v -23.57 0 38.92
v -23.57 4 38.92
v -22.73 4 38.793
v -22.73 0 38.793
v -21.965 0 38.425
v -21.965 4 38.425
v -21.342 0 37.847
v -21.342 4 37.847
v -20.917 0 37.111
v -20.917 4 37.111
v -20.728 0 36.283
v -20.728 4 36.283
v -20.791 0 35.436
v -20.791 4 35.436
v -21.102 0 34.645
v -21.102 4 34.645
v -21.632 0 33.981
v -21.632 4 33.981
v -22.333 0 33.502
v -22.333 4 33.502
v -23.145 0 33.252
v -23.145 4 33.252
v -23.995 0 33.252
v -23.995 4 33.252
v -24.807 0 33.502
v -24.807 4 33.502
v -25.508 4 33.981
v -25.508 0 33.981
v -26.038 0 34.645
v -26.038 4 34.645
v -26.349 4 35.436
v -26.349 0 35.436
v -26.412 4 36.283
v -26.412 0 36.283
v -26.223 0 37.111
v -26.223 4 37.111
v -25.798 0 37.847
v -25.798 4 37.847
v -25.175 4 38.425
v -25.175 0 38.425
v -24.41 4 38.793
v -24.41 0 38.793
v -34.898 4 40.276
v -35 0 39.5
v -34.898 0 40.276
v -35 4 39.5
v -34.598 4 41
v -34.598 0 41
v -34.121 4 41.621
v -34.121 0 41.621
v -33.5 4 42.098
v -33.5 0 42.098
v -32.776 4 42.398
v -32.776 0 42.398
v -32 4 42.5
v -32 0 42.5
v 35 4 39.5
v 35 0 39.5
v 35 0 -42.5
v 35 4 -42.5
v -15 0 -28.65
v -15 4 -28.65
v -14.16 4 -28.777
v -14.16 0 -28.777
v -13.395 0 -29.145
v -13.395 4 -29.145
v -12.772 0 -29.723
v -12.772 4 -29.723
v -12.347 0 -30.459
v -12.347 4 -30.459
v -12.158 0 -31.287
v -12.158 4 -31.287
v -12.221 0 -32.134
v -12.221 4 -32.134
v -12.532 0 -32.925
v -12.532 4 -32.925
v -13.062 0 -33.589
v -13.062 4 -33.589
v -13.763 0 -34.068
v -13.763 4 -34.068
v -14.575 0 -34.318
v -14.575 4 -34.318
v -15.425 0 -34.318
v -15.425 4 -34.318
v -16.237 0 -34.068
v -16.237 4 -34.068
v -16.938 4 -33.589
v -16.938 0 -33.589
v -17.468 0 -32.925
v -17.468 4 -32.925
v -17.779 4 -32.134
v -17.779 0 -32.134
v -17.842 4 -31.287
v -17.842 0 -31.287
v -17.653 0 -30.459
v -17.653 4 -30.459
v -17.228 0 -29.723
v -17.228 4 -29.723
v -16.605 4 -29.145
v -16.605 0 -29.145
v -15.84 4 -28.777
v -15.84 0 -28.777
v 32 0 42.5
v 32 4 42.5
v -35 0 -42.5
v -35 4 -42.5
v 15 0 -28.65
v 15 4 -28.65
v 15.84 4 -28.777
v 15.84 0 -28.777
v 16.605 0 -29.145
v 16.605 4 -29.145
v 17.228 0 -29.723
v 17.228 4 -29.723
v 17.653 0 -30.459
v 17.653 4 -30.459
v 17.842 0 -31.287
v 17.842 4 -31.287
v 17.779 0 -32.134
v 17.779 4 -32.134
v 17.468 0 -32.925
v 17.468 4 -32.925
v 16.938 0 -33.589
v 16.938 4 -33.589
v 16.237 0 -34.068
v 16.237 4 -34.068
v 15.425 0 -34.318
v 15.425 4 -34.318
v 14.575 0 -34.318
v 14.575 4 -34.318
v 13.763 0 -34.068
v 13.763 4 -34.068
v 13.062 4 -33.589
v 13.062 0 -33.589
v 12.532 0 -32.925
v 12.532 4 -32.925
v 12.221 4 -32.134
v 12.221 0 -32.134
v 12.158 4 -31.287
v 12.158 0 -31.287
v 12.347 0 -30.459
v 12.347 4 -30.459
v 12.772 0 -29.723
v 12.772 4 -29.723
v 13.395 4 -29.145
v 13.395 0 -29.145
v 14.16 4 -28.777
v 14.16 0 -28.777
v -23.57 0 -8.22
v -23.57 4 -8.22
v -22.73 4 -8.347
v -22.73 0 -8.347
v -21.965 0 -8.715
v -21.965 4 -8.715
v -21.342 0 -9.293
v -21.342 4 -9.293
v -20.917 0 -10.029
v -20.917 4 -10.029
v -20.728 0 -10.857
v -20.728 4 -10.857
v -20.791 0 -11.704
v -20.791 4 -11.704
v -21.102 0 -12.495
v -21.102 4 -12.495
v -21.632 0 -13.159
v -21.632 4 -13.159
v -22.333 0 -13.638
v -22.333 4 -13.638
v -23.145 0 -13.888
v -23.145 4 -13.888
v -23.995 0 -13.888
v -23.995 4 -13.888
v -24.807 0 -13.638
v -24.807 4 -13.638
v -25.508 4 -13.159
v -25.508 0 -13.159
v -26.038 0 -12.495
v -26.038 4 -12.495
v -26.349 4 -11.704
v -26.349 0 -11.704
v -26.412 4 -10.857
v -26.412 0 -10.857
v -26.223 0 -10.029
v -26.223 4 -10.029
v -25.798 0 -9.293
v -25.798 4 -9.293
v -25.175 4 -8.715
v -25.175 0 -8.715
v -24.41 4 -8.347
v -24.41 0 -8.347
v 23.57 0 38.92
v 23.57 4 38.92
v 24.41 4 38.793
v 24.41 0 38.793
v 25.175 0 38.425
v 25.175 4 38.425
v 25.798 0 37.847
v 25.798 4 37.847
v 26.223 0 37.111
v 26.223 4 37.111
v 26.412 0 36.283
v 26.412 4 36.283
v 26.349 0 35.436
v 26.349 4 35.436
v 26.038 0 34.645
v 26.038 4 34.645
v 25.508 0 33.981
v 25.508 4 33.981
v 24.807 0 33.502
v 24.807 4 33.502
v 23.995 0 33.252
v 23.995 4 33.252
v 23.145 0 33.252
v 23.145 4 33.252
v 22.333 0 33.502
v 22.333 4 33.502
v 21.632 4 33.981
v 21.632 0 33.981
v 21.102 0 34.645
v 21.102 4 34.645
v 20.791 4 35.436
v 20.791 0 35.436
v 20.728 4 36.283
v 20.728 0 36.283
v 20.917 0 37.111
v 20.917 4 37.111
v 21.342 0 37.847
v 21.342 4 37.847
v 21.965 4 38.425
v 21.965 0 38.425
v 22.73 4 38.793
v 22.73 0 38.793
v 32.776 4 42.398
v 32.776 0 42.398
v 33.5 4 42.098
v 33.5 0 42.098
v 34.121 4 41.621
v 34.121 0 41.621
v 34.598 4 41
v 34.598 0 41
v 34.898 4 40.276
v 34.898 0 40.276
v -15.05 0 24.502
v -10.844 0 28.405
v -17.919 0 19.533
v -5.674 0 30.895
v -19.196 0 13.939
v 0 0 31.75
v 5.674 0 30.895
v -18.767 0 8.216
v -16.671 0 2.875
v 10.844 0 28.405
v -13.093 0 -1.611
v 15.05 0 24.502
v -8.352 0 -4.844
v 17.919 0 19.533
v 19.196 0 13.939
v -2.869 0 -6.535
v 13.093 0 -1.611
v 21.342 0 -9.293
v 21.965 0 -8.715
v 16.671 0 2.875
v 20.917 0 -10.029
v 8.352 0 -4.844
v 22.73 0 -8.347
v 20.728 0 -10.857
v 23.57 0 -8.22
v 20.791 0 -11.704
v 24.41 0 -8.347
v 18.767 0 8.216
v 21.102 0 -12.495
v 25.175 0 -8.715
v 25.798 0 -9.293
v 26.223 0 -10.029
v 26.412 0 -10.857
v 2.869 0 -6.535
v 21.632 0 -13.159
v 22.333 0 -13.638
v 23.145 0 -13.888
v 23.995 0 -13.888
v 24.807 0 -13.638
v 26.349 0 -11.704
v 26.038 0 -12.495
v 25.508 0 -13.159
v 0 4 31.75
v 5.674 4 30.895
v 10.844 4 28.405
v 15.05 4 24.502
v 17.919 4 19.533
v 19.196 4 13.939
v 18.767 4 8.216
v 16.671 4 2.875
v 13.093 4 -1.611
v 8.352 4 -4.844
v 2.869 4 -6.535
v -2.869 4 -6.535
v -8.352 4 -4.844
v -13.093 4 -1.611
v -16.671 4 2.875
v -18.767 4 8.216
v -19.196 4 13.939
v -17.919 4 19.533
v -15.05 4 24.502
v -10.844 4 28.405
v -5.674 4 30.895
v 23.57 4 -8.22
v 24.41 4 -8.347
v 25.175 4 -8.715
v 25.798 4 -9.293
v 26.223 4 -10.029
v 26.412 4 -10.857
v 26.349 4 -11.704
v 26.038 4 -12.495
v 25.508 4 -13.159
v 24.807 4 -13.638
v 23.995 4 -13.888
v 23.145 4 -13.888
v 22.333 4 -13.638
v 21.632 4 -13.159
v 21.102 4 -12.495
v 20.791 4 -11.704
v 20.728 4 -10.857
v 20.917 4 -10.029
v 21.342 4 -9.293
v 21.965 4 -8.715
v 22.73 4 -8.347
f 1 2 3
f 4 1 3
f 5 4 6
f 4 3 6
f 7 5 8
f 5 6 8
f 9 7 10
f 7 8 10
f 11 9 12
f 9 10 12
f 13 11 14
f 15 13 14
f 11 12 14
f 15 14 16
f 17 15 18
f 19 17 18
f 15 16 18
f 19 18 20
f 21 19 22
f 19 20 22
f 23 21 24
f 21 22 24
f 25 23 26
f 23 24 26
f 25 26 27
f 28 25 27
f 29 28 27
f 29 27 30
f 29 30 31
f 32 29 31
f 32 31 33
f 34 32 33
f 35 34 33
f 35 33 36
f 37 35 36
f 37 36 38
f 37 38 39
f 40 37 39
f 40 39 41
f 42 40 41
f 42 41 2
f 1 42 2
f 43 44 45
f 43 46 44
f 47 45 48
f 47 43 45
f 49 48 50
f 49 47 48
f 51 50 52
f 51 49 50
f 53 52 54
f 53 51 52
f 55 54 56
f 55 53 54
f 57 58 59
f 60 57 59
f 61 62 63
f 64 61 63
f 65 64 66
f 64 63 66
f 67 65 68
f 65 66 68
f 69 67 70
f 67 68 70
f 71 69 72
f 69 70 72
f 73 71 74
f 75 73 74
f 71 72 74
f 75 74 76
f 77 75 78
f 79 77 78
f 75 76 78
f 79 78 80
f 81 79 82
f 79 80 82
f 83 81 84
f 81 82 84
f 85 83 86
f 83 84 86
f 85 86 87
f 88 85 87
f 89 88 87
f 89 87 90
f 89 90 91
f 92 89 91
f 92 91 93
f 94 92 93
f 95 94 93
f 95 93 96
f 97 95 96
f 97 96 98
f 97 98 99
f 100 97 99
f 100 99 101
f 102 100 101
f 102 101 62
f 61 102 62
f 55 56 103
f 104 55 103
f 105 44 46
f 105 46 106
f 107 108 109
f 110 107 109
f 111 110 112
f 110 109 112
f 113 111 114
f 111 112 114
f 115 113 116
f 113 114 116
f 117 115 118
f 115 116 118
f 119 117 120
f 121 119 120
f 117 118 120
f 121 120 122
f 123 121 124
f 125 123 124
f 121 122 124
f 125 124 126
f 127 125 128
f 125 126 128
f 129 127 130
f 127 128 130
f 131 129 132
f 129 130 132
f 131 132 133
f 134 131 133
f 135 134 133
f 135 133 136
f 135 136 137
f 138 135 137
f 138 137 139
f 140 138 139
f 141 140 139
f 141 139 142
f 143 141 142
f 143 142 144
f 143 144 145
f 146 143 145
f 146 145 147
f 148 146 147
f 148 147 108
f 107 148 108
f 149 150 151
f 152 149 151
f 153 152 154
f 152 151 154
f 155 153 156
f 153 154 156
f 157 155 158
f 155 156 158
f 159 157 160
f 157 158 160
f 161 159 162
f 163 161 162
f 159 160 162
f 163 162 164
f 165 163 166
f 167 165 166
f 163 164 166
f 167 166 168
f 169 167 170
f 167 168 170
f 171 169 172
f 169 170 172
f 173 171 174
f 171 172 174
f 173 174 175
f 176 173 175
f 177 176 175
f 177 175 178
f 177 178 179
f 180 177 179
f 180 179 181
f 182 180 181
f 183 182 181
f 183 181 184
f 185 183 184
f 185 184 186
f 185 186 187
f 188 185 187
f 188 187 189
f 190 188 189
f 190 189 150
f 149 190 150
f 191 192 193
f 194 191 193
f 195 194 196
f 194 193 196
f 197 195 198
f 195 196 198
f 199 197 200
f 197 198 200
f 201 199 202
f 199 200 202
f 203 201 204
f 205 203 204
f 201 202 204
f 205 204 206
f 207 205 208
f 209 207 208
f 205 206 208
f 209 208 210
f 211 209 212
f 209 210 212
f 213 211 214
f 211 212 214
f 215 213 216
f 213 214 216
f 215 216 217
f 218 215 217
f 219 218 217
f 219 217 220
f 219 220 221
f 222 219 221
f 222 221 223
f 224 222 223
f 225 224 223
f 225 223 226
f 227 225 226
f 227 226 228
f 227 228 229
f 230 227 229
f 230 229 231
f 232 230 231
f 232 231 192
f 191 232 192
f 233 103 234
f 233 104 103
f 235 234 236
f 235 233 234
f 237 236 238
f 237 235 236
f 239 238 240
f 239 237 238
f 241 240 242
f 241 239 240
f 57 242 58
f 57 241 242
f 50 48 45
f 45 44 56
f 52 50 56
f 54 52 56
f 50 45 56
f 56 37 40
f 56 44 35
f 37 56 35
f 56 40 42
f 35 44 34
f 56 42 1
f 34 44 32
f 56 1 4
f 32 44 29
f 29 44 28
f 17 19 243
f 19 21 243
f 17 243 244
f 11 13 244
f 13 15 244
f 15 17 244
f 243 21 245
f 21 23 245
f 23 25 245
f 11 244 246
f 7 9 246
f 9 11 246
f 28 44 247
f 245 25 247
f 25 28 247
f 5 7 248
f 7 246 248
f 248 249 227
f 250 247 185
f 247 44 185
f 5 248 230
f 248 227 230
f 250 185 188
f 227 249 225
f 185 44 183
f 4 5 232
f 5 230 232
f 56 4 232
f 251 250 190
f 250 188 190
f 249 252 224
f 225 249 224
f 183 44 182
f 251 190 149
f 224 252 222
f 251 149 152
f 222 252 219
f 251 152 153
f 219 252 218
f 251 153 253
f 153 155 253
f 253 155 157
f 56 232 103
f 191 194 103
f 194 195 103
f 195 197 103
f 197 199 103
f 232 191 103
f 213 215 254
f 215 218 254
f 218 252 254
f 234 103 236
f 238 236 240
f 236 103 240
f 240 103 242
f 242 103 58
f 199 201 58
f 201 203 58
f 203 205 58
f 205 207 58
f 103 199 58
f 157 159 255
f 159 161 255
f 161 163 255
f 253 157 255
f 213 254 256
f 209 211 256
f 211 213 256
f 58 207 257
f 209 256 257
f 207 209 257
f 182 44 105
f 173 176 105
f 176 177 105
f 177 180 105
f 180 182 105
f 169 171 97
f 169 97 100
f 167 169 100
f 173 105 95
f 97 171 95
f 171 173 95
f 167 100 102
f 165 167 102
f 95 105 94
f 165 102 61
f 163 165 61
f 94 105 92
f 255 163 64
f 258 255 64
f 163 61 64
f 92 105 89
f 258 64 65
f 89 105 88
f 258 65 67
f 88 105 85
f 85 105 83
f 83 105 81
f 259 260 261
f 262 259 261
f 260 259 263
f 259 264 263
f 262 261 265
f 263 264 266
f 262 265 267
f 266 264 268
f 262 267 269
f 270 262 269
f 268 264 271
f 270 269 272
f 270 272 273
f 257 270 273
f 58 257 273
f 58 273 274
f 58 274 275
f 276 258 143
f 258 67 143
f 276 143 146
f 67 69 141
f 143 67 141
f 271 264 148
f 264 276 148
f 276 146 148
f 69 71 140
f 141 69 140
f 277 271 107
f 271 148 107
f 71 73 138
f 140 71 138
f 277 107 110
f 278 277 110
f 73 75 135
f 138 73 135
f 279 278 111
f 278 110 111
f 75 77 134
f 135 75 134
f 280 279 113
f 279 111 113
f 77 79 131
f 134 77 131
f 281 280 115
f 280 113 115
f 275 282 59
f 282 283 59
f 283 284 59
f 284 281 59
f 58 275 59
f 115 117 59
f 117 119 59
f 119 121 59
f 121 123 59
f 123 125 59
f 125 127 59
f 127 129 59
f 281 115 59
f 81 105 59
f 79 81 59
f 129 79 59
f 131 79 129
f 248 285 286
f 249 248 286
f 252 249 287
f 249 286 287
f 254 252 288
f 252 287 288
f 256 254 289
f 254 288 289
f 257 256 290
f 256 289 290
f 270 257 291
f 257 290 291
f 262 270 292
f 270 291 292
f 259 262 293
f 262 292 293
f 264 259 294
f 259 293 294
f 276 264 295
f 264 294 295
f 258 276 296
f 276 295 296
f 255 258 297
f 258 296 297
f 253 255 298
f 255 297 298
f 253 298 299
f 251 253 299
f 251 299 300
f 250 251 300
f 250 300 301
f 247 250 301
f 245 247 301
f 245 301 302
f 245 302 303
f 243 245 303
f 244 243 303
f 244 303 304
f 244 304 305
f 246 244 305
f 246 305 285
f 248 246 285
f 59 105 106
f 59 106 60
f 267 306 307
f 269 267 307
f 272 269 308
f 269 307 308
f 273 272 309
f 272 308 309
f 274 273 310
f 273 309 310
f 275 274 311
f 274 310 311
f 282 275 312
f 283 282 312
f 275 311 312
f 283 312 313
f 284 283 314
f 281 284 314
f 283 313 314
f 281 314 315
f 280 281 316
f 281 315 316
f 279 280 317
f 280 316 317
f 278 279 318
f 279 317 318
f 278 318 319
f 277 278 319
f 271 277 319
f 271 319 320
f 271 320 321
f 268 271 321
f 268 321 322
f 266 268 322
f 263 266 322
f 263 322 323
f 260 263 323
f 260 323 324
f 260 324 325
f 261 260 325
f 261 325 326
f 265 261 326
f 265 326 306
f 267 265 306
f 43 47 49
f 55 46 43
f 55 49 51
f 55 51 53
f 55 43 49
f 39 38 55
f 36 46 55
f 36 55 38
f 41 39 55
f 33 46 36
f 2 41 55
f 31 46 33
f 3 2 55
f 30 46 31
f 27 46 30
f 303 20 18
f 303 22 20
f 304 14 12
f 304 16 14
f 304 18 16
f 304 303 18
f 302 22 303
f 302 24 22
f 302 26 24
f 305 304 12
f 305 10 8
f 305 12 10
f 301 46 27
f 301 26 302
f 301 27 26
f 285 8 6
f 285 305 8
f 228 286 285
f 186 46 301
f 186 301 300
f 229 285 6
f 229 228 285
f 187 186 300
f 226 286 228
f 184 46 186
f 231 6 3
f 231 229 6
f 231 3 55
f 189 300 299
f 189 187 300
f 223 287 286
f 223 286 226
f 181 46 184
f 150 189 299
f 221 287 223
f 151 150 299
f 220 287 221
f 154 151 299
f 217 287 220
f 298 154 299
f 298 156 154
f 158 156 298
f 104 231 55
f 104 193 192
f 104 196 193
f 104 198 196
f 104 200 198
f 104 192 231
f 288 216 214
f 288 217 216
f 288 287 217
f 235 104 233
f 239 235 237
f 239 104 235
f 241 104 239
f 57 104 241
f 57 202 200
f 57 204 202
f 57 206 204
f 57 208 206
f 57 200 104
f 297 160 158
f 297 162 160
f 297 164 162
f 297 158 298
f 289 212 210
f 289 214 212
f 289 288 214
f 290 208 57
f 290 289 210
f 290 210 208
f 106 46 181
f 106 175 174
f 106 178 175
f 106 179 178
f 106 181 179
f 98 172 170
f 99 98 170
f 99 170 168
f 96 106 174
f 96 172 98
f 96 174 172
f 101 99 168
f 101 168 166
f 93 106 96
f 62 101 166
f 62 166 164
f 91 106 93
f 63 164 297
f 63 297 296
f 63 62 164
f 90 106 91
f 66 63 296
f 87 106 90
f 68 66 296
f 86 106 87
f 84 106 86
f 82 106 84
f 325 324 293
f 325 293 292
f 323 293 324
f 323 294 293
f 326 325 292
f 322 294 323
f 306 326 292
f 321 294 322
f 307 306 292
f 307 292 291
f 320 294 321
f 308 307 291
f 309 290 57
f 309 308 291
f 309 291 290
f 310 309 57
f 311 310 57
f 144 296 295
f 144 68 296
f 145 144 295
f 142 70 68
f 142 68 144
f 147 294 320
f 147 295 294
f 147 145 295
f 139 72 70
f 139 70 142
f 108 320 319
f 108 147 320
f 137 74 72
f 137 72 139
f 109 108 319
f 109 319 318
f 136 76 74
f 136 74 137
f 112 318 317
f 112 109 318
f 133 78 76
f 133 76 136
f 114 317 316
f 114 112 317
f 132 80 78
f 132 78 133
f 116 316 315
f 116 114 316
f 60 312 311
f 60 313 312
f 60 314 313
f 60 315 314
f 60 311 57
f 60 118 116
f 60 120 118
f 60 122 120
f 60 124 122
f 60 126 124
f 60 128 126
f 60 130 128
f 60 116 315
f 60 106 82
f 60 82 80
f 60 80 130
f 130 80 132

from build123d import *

# Parameters (mm, degrees)
SKETCH1_W           = 70
SKETCH1_H           = 85
BOSS_EXTRUDE1_DEPTH = 4
SKETCH2_R           = 2.85
SKETCH2_R_2         = 19.25
CUT_EXTRUDE1_DEPTH  = 56.201902141
FILLET1_R           = 3


with BuildPart() as part:
    # Sketch1 → Boss-Extrude1 (new body)
    with BuildSketch(Plane(origin=(0, 0, 0), x_dir=(1, 0, 0), z_dir=(0, 1, 0))):
        Rectangle(SKETCH1_W, SKETCH1_H)
    extrude(amount=BOSS_EXTRUDE1_DEPTH)

    # Sketch2 → Cut-Extrude1 (cut, through all)
    with BuildSketch(Plane(origin=(0, 4, 0), x_dir=(1, 0, 0), z_dir=(0, 1, 0))):
        with Locations(Location((-23.57, 11.07, 0), (0, 0, 270))):
            Circle(SKETCH2_R)
        with Locations(Location((-23.57, -36.07, 0), (0, 0, 270))):
            Circle(SKETCH2_R)
        with Locations(Location((23.57, -36.07, 0), (0, 0, 270))):
            Circle(SKETCH2_R)
        with Locations(Location((23.57, 11.07, 0), (0, 0, 270))):
            Circle(SKETCH2_R)
        with Locations(Location((0, -12.5, 0), (0, 0, 270))):
            Circle(SKETCH2_R_2)
        with Locations(Location((15, 31.5, 0), (0, 0, 270))):
            Circle(SKETCH2_R)
        with Locations(Location((-15, 31.5, 0), (0, 0, 270))):
            Circle(SKETCH2_R)
    extrude(amount=-CUT_EXTRUDE1_DEPTH, mode=Mode.SUBTRACT)

    # Fillet1
    fillet1_edges = [part.edges().sort_by_distance(p)[0] for p in [
        (35, 2, 42.5),
        (-35, 2, 42.5),
    ]]
    fillet(fillet1_edges, radius=FILLET1_R)


solid = part.part
